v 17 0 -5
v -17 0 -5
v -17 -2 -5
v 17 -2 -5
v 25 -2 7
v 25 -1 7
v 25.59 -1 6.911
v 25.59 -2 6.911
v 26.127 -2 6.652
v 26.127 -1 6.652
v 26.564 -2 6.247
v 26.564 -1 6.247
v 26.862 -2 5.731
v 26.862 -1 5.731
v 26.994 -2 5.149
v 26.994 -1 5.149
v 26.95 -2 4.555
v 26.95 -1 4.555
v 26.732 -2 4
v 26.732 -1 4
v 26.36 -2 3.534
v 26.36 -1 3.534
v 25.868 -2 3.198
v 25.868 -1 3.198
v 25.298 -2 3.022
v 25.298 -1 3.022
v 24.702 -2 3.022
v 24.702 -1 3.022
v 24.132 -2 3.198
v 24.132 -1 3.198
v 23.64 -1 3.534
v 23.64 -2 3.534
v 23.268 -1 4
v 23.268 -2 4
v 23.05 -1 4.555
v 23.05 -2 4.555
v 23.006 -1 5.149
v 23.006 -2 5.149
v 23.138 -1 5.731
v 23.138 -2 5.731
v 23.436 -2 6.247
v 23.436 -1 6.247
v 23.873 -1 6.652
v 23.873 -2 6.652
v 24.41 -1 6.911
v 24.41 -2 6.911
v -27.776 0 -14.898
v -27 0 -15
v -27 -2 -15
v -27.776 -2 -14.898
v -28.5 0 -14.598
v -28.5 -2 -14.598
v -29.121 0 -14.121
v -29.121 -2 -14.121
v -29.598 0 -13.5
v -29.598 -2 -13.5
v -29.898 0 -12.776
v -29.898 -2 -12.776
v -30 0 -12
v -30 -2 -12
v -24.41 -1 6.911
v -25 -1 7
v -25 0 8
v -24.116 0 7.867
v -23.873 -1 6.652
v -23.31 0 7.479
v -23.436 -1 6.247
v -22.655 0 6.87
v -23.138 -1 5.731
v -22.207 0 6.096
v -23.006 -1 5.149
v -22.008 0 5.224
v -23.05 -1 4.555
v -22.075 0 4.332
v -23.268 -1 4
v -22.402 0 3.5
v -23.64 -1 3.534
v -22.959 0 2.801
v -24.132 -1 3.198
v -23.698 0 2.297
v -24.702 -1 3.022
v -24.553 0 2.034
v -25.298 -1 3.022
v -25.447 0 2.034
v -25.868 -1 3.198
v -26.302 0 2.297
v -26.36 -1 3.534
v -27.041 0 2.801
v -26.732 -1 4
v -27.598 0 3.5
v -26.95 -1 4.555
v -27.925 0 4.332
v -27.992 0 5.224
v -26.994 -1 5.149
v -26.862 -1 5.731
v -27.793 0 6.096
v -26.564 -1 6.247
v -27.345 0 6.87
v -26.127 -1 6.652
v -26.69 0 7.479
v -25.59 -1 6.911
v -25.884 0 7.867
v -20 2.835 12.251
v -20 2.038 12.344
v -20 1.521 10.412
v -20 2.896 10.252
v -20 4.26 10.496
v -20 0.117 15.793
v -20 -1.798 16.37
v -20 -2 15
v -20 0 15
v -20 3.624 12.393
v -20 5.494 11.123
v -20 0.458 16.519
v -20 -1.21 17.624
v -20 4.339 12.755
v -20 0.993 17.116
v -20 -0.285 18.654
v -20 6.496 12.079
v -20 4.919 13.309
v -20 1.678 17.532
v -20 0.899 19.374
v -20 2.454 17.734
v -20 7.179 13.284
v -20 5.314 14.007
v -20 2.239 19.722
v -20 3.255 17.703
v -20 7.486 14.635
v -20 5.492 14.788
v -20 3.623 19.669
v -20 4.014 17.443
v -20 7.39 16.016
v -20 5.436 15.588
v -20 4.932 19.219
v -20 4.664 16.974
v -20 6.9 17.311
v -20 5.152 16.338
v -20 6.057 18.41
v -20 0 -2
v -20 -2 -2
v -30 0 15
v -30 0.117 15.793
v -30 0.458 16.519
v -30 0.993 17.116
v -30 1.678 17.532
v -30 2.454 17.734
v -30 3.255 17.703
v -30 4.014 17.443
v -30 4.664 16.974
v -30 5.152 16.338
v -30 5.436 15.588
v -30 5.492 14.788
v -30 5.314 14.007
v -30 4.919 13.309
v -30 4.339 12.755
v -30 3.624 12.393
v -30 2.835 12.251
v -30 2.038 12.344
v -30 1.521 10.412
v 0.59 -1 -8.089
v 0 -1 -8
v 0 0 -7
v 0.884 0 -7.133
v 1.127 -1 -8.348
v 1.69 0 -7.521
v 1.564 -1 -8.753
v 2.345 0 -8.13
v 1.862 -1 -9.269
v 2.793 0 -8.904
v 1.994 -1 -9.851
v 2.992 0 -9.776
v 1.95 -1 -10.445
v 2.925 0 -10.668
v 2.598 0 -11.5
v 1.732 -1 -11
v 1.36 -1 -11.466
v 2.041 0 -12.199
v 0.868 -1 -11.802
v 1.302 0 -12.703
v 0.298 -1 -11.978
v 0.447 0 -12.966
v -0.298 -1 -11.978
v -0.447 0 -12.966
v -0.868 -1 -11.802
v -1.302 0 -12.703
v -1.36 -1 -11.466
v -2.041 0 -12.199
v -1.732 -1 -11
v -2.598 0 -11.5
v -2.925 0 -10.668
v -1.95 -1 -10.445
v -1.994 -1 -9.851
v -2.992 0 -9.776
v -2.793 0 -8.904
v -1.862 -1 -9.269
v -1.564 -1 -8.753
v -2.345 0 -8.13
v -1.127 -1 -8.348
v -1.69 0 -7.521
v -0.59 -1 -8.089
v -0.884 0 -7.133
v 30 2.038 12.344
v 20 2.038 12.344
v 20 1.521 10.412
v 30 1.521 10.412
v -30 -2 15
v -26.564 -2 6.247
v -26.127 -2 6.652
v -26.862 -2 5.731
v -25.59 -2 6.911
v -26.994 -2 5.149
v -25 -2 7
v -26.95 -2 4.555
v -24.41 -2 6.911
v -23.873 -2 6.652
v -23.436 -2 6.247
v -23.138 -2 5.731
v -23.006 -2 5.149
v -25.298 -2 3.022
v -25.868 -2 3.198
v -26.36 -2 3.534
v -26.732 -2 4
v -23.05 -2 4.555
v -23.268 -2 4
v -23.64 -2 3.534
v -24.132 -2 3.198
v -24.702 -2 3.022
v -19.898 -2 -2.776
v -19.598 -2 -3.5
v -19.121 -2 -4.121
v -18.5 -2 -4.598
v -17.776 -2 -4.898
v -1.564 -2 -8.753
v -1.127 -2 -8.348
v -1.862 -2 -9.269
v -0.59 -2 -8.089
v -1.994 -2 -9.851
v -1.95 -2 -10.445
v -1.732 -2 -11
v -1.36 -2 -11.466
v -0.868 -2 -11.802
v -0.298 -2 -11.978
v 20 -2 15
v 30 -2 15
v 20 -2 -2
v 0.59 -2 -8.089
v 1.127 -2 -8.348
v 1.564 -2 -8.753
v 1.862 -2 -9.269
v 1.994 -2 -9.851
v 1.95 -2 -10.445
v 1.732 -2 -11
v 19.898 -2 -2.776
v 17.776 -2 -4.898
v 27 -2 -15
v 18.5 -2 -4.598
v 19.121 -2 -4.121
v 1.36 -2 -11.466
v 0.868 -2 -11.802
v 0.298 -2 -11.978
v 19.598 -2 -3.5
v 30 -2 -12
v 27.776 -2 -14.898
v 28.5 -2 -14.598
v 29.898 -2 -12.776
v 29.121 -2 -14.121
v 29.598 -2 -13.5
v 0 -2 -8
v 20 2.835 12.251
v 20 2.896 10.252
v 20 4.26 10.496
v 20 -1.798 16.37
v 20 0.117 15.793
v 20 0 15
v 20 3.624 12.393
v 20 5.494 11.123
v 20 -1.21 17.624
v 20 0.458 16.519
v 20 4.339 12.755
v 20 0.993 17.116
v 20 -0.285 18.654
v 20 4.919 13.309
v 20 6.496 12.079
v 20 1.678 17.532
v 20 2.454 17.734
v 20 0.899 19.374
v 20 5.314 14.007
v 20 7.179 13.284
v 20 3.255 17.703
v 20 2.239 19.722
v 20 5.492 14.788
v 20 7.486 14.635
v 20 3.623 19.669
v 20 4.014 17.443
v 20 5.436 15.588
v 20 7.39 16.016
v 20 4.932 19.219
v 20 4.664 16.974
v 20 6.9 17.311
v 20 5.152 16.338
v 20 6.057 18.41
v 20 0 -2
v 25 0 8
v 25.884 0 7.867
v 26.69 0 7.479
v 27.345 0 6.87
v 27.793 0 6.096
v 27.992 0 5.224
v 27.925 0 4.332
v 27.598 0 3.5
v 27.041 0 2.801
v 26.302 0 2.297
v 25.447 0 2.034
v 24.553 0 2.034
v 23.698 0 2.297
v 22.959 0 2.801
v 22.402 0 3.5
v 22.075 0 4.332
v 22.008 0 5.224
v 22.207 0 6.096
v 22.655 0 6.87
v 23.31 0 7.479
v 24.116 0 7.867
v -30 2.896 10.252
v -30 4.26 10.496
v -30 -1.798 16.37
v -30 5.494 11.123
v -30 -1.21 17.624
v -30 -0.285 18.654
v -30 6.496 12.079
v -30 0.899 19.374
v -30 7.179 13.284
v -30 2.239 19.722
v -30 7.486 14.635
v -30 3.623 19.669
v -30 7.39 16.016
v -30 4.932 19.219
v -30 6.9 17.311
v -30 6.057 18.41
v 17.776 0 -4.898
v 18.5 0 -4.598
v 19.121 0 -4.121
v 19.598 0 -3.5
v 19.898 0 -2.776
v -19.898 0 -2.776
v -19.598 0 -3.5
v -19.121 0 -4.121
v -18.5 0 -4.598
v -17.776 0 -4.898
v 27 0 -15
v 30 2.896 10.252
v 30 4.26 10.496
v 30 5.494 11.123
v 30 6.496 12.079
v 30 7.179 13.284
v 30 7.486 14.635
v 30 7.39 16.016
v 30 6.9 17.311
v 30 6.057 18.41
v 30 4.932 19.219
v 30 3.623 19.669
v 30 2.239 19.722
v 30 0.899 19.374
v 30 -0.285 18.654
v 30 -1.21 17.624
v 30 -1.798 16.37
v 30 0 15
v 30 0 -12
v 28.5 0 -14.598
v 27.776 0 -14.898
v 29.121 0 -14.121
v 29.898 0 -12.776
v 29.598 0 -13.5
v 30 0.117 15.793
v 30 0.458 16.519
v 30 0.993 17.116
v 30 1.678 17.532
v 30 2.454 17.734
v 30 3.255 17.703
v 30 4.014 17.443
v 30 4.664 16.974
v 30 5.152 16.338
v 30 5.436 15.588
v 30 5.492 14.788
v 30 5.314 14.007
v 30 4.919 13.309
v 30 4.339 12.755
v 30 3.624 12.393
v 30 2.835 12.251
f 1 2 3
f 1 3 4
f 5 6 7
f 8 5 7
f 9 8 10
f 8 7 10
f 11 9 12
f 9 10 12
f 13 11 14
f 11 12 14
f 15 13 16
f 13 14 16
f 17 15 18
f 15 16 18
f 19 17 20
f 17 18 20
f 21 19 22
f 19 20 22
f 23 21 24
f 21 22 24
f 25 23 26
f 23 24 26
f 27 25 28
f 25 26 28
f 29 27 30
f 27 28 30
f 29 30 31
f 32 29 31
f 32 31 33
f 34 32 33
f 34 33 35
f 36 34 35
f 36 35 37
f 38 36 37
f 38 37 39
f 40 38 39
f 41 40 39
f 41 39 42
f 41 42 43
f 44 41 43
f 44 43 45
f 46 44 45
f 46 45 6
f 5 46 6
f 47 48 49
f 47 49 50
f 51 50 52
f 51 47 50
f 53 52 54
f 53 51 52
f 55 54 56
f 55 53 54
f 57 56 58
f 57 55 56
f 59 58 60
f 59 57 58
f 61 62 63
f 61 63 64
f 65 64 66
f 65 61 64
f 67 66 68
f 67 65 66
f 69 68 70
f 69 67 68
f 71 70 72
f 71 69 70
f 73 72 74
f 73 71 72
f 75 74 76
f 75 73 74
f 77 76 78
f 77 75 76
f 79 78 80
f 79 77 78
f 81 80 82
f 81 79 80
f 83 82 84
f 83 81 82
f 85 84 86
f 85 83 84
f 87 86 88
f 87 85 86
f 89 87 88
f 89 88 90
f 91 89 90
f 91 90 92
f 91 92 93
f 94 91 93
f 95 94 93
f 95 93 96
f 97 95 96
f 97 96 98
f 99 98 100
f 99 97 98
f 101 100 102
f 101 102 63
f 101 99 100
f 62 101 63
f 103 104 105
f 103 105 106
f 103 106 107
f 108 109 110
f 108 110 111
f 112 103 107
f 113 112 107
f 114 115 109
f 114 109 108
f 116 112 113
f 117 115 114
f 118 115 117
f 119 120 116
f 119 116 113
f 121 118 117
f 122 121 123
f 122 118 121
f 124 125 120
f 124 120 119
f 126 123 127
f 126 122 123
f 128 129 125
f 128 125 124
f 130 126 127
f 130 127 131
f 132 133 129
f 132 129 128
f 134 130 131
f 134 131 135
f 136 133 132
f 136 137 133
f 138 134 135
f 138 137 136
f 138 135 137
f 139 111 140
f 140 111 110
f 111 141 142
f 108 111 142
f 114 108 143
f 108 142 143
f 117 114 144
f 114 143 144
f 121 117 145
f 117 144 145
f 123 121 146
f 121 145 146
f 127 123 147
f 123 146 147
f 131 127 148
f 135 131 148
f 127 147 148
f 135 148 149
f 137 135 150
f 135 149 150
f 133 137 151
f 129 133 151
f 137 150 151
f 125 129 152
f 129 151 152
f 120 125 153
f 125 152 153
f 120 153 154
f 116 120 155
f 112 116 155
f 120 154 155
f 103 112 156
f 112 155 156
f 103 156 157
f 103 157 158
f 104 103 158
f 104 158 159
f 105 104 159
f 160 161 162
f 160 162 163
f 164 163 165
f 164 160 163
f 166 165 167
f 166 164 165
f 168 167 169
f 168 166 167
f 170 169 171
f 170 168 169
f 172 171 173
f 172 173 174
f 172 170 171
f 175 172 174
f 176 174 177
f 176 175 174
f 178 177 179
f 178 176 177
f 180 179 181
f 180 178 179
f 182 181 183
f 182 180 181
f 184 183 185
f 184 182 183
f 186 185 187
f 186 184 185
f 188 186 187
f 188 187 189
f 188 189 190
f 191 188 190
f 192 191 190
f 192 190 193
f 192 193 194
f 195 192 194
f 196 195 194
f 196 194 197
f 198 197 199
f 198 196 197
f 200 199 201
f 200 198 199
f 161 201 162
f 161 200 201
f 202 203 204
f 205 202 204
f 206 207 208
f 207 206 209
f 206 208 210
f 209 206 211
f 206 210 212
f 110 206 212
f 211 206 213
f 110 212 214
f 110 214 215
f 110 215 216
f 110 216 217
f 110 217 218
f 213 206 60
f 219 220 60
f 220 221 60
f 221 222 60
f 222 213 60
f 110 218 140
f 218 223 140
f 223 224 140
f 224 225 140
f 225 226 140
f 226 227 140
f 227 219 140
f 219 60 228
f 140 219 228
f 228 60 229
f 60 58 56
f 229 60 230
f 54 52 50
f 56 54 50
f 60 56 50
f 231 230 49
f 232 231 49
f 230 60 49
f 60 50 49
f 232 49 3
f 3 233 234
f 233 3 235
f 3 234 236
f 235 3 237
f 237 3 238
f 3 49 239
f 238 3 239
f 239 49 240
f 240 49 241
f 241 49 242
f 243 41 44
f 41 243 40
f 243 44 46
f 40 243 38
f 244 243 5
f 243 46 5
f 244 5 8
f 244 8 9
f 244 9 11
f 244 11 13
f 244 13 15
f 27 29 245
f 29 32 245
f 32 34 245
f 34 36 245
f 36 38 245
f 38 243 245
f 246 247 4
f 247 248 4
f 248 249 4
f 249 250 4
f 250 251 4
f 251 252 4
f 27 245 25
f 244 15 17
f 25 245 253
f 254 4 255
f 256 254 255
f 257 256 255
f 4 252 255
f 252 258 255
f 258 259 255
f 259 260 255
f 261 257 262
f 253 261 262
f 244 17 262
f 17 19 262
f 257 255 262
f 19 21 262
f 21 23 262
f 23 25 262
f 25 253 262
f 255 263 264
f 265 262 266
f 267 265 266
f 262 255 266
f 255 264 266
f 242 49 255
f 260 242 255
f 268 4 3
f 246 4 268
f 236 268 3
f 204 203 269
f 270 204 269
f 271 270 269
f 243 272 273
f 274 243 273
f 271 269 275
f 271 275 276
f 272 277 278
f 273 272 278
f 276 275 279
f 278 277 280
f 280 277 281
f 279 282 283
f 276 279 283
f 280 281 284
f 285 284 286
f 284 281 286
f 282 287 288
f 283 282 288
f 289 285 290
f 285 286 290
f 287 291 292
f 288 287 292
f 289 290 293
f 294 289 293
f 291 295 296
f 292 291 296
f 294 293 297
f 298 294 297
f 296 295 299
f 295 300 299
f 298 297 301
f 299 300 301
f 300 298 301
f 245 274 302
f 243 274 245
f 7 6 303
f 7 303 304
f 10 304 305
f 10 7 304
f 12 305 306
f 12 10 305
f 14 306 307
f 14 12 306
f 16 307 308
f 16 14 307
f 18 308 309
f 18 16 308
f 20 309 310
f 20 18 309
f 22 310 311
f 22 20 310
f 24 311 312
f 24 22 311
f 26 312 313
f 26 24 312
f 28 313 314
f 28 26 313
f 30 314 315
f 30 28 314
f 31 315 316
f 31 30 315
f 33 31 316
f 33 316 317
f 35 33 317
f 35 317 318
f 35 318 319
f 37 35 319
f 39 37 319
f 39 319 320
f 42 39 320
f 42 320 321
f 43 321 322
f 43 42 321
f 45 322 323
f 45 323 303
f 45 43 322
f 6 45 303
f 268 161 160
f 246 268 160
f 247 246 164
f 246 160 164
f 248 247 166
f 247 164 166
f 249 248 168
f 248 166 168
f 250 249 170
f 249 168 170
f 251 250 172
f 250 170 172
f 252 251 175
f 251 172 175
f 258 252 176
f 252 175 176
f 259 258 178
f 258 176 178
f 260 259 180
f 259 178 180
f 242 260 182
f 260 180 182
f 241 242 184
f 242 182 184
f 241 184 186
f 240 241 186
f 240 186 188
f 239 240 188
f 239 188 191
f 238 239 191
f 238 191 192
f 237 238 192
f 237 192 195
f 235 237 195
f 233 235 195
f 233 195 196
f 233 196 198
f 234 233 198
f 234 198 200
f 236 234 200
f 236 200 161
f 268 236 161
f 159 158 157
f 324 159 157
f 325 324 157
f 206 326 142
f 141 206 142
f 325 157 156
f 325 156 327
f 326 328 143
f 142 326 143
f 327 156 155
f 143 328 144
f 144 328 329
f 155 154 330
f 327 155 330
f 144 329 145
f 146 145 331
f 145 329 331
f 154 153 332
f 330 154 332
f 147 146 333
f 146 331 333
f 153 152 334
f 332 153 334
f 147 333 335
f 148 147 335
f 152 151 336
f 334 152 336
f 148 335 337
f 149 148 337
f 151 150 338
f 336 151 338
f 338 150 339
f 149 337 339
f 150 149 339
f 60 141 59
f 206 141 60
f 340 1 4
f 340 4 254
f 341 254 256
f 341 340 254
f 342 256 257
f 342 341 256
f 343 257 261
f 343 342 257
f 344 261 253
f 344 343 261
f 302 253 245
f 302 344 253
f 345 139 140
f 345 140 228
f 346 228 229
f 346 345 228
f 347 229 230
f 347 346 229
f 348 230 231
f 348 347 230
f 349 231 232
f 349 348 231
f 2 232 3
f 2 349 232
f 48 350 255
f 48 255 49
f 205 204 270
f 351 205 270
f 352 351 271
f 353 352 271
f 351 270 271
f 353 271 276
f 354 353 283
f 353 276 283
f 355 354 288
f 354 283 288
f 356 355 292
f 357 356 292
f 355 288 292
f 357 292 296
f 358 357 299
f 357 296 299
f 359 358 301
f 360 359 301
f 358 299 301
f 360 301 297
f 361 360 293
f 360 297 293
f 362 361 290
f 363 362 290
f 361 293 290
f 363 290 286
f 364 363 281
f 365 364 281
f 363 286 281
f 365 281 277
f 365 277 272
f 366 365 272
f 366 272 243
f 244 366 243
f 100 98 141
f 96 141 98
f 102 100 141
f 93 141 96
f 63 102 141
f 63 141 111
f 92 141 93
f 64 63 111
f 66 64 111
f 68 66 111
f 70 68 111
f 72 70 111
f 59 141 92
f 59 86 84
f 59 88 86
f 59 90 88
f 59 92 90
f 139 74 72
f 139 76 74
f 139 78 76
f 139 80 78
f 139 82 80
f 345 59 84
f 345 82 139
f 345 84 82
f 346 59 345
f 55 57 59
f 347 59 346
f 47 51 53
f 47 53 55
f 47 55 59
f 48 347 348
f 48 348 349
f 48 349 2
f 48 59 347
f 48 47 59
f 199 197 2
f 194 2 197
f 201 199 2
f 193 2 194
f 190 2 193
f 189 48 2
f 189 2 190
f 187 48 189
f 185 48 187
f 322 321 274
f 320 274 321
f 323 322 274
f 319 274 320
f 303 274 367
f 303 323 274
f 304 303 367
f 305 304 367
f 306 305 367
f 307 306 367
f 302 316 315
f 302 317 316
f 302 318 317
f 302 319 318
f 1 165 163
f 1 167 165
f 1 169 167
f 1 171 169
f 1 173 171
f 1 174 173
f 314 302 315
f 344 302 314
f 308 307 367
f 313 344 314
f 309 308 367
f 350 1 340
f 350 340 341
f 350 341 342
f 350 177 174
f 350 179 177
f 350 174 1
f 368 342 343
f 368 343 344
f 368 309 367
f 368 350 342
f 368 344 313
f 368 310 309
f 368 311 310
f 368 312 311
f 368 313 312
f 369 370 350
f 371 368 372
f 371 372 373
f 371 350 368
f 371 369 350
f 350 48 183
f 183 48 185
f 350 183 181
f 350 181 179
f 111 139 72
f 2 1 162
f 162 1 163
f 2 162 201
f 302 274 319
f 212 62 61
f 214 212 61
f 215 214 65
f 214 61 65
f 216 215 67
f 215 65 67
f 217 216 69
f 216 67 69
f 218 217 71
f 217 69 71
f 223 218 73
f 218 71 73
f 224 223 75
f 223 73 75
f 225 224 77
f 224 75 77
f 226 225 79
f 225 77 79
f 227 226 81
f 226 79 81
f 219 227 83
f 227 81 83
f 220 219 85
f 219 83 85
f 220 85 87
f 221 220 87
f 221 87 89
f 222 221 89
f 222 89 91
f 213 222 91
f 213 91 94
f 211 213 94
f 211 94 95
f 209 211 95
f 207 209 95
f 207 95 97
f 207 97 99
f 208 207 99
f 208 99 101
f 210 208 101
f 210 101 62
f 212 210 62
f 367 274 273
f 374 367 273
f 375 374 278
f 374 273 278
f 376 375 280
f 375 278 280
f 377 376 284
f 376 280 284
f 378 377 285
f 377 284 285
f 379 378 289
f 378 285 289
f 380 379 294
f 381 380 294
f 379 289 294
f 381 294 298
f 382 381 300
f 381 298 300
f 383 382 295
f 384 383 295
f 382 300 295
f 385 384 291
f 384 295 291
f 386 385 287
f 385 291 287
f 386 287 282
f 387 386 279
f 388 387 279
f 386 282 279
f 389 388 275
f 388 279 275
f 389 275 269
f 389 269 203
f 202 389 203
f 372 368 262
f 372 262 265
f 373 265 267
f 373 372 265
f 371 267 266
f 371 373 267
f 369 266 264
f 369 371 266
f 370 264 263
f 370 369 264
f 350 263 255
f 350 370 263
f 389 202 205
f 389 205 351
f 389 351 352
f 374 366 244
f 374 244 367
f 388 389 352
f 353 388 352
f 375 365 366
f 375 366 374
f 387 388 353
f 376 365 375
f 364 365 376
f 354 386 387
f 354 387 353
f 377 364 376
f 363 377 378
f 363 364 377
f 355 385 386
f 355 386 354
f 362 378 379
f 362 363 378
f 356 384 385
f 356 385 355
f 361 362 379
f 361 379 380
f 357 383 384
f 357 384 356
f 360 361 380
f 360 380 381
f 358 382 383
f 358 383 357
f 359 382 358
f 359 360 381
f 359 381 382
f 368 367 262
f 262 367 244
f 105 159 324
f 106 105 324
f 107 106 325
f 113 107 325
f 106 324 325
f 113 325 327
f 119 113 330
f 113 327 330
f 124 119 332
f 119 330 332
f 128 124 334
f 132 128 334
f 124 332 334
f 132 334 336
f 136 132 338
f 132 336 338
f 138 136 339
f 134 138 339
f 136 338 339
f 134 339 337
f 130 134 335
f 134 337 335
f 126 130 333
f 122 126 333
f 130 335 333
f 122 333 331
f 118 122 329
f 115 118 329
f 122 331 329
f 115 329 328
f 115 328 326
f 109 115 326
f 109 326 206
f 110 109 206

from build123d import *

# Parameters (mm, degrees)
BASE_FLANGE1_DEPTH = 2
HEM1_START         = -30
HEM1_DEPTH         = 10
HEM1_START_2       = 20
HEM1_2_DEPTH       = 10
SKETCH14_R         = 2
CUT_EXTRUDE1_DEPTH = 10
CHAMFER1_SIZE      = 1


# Read off the part's stored shape, not the designer's step: Hem1
# Sheet-metal steps are written as plain solids
with BuildPart() as part:
    # Sketch1 → Base-Flange1 (new body)
    with BuildSketch(Plane(origin=(0, 0, 0), x_dir=(1, 0, 0), z_dir=(0, 1, 0))):
        with BuildLine():
            Line((20, -15), (30, -15))
            Line((30, -15), (30, 12))
            ThreePointArc((30, 12), (29.121320344, 14.121320344), (27, 15))
            Line((27, 15), (-27, 15))
            ThreePointArc((-27, 15), (-29.121320344, 14.121320344), (-30, 12))
            Line((-30, 12), (-30, -15))
            Line((-30, -15), (-20, -15))
            Line((-20, -15), (-20, 2))
            ThreePointArc((-20, 2), (-19.121320344, 4.121320344), (-17, 5))
            Line((-17, 5), (17, 5))
            ThreePointArc((17, 5), (19.121320344, 4.121320344), (20, 2))
            Line((20, 2), (20, -15))
        make_face()
    extrude(amount=-BASE_FLANGE1_DEPTH)

    # Hem1 outline → Hem1 (add)
    with BuildSketch(Plane.YZ.offset(HEM1_START)):
        with BuildLine():
            Line((2.038247626, 12.343703978), (1.520609536, 10.411852325))
            ThreePointArc((1.520609536, 10.411852325), (6.518428366, 17.891616788), (-2, 15))
            Line((-2, 15), (0, 15))
            ThreePointArc((0, 15), (4.931721686, 16.67409393), (2.038247626, 12.343703978))
        make_face()
    extrude(amount=HEM1_DEPTH)

    # Hem1 2 outline → Hem1 2 (add)
    with BuildSketch(Plane.YZ.offset(HEM1_START_2)):
        with BuildLine():
            Line((2.038247626, 12.343703978), (1.520609536, 10.411852325))
            ThreePointArc((1.520609536, 10.411852325), (6.518428366, 17.891616788), (-2, 15))
            Line((-2, 15), (0, 15))
            ThreePointArc((0, 15), (4.931721686, 16.67409393), (2.038247626, 12.343703978))
        make_face()
    extrude(amount=HEM1_2_DEPTH)

    # Sketch14 → Cut-Extrude1 (cut)
    with BuildSketch(Plane(origin=(0, 0, 0), x_dir=(1, 0, 0), z_dir=(0, 1, 0))):
        with Locations(Location((0, 10, 0), (0, 0, 270))):
            Circle(SKETCH14_R)
        with Locations(Location((-25, -5, 0), (0, 0, 270))):
            Circle(SKETCH14_R)
        with Locations(Location((25, -5, 0), (0, 0, 270))):
            Circle(SKETCH14_R)
    extrude(amount=-CUT_EXTRUDE1_DEPTH, mode=Mode.SUBTRACT)

    # Chamfer1
    chamfer1_edges = [part.edges().sort_by_distance(p)[0] for p in [
        (0, 0, -12),
        (-25, 0, 3),
        (25, 0, 3),
    ]]
    chamfer(chamfer1_edges, length=CHAMFER1_SIZE)


solid = part.part
